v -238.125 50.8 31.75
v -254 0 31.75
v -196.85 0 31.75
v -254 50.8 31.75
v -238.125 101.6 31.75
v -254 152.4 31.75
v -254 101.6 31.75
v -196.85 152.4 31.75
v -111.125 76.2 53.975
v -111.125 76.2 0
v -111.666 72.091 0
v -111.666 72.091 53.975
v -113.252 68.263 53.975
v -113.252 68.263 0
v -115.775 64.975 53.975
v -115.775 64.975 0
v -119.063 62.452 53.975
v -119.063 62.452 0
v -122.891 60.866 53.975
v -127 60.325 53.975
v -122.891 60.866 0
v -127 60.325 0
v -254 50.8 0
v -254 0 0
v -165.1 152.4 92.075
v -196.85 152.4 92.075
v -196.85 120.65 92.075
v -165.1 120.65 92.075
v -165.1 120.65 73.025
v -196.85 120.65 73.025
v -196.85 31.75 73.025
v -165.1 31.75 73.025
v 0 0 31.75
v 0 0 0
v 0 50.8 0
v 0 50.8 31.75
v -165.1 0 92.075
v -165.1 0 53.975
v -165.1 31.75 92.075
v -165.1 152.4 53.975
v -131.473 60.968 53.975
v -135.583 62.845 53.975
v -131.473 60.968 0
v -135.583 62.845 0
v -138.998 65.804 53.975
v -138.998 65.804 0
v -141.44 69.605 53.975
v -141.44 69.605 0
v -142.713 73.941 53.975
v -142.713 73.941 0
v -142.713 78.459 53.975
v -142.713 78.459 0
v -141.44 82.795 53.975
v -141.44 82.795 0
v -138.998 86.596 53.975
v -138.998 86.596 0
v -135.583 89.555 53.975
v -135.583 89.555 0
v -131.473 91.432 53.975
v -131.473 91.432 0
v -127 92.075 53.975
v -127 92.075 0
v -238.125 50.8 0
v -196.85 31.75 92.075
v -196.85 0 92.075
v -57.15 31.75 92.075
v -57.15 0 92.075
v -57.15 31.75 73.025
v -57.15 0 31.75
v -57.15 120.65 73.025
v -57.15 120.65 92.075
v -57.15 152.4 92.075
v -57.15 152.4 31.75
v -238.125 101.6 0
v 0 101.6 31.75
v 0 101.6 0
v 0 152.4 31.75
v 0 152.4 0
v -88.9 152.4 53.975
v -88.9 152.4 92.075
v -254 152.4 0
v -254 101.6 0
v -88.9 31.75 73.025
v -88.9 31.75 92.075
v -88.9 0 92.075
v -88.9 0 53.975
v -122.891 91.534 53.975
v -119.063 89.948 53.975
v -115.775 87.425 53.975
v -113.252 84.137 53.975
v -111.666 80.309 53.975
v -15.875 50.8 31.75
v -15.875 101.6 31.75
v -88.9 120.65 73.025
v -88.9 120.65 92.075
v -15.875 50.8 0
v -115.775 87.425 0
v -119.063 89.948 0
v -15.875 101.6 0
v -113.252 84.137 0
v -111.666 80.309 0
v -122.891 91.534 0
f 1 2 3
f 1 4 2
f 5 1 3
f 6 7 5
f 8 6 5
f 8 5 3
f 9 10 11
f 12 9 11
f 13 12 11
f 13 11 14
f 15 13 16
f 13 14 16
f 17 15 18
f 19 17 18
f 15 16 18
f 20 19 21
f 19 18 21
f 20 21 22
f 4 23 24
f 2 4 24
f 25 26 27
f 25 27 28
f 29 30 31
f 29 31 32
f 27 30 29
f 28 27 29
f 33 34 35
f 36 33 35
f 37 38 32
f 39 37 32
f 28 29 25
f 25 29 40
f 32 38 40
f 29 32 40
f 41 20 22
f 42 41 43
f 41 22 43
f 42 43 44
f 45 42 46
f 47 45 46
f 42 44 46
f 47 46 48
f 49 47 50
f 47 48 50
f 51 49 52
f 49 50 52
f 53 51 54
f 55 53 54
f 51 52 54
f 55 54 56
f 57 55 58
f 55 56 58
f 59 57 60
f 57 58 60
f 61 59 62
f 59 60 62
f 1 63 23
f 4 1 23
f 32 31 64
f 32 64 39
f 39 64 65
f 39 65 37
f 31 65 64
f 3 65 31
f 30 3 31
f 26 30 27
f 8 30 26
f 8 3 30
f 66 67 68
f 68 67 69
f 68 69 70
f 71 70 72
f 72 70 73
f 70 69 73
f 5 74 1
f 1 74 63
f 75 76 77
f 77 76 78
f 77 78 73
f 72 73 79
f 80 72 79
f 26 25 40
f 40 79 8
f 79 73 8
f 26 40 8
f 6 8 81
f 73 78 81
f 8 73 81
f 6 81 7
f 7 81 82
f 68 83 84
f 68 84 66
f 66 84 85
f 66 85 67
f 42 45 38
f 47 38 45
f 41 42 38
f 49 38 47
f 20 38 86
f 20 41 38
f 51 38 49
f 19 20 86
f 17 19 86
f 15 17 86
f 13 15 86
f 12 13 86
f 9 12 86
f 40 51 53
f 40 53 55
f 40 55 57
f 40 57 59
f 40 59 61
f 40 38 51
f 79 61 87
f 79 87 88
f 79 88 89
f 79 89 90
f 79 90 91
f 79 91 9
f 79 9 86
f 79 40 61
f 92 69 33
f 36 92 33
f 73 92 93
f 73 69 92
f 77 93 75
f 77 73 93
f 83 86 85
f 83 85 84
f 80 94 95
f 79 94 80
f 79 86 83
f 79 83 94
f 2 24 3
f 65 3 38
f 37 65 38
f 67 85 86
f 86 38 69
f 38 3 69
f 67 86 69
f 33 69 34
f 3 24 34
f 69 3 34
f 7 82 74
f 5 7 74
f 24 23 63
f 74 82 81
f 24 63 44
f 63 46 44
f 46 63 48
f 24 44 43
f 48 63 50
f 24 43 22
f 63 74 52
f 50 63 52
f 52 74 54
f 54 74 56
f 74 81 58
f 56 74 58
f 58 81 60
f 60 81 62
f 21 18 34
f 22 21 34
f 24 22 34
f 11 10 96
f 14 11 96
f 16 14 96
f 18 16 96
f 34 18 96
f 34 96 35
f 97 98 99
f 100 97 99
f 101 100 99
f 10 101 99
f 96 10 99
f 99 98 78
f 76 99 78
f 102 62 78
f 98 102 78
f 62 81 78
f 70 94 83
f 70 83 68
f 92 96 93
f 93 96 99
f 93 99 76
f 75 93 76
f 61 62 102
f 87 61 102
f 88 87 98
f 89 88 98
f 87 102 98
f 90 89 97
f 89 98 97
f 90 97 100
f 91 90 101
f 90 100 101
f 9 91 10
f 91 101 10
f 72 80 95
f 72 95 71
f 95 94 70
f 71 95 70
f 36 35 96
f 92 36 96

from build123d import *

# Parameters (mm, degrees)
F1_DEPTH = 31.75
F0_W     = 31.75
F0_H     = 31.75
F2_DEPTH = 92.075
F0_H_2   = 88.9
F3_DEPTH = 73.025
F4_DEPTH = 53.975
F5_DEPTH = 53.975
F6_DEPTH = 92.075
F7_DEPTH = 73.025
F8_DEPTH = 31.75


with BuildPart() as f1:
    # F0 (on Top) → F1 (new body)
    with BuildSketch(Plane.XY):
        Polygon((-57.15, 0), (0, 0), (0, 50.8), (-15.875, 50.8), (-15.875, 101.6), (0, 101.6), (0, 152.4), (-57.15, 152.4), (-57.15, 120.65), (-57.15, 31.75), align=None)
    extrude(amount=F1_DEPTH)

    # F0 (on Top) → F2 (join)
    with BuildSketch(Plane.XY):
        with Locations((-73.025, 136.525)):
            Rectangle(F0_W, F0_H)
        with Locations((-73.025, 15.875)):
            Rectangle(F0_W, F0_H)
    extrude(amount=F2_DEPTH)

    # F0 (on Top) → F3 (join)
    with BuildSketch(Plane.XY):
        with Locations((-73.025, 76.2)):
            Rectangle(F0_W, F0_H_2)
    extrude(amount=F3_DEPTH)

    # F0 (on Top) → F4 (join)
    with BuildSketch(Plane.XY):
        with BuildLine():
            Line((-127, 0), (-88.9, 0))
            Line((-88.9, 0), (-88.9, 31.75))
            Line((-88.9, 31.75), (-88.9, 120.65))
            Line((-88.9, 120.65), (-88.9, 152.4))
            Line((-88.9, 152.4), (-127, 152.4))
            Line((-127, 152.4), (-127, 92.075))
            ThreePointArc((-127, 92.075), (-115.7746798487, 87.4253201513), (-111.125, 76.2))
            ThreePointArc((-111.125, 76.2), (-115.7746798487, 64.9746798487), (-127, 60.325))
            Line((-127, 60.325), (-127, 0))
        make_face()
    extrude(amount=F4_DEPTH)

    # F0 (on Top) → F5 (join)
    with BuildSketch(Plane.XY):
        with BuildLine():
            Line((-165.1, 0), (-127, 0))
            Line((-127, 0), (-127, 60.325))
            ThreePointArc((-127, 60.325), (-142.875, 76.2), (-127, 92.075))
            Line((-127, 92.075), (-127, 152.4))
            Line((-127, 152.4), (-165.1, 152.4))
            Line((-165.1, 152.4), (-165.1, 120.65))
            Line((-165.1, 120.65), (-165.1, 31.75))
            Line((-165.1, 31.75), (-165.1, 0))
        make_face()
    extrude(amount=F5_DEPTH)

    # F0 (on Top) → F6 (join)
    with BuildSketch(Plane.XY):
        with Locations((-180.975, 136.525)):
            Rectangle(F0_W, F0_H)
        with Locations((-180.975, 15.875)):
            Rectangle(F0_W, F0_H)
    extrude(amount=F6_DEPTH)

    # F0 (on Top) → F7 (join)
    with BuildSketch(Plane.XY):
        with Locations((-180.975, 76.2)):
            Rectangle(F0_W, F0_H_2)
    extrude(amount=F7_DEPTH)

    # F0 (on Top) → F8 (join)
    with BuildSketch(Plane.XY):
        Polygon((-254, 0), (-196.85, 0), (-196.85, 31.75), (-196.85, 120.65), (-196.85, 152.4), (-254, 152.4), (-254, 101.6), (-238.125, 101.6), (-238.125, 50.8), (-254, 50.8), align=None)
    extrude(amount=F8_DEPTH)


solid = f1.part
